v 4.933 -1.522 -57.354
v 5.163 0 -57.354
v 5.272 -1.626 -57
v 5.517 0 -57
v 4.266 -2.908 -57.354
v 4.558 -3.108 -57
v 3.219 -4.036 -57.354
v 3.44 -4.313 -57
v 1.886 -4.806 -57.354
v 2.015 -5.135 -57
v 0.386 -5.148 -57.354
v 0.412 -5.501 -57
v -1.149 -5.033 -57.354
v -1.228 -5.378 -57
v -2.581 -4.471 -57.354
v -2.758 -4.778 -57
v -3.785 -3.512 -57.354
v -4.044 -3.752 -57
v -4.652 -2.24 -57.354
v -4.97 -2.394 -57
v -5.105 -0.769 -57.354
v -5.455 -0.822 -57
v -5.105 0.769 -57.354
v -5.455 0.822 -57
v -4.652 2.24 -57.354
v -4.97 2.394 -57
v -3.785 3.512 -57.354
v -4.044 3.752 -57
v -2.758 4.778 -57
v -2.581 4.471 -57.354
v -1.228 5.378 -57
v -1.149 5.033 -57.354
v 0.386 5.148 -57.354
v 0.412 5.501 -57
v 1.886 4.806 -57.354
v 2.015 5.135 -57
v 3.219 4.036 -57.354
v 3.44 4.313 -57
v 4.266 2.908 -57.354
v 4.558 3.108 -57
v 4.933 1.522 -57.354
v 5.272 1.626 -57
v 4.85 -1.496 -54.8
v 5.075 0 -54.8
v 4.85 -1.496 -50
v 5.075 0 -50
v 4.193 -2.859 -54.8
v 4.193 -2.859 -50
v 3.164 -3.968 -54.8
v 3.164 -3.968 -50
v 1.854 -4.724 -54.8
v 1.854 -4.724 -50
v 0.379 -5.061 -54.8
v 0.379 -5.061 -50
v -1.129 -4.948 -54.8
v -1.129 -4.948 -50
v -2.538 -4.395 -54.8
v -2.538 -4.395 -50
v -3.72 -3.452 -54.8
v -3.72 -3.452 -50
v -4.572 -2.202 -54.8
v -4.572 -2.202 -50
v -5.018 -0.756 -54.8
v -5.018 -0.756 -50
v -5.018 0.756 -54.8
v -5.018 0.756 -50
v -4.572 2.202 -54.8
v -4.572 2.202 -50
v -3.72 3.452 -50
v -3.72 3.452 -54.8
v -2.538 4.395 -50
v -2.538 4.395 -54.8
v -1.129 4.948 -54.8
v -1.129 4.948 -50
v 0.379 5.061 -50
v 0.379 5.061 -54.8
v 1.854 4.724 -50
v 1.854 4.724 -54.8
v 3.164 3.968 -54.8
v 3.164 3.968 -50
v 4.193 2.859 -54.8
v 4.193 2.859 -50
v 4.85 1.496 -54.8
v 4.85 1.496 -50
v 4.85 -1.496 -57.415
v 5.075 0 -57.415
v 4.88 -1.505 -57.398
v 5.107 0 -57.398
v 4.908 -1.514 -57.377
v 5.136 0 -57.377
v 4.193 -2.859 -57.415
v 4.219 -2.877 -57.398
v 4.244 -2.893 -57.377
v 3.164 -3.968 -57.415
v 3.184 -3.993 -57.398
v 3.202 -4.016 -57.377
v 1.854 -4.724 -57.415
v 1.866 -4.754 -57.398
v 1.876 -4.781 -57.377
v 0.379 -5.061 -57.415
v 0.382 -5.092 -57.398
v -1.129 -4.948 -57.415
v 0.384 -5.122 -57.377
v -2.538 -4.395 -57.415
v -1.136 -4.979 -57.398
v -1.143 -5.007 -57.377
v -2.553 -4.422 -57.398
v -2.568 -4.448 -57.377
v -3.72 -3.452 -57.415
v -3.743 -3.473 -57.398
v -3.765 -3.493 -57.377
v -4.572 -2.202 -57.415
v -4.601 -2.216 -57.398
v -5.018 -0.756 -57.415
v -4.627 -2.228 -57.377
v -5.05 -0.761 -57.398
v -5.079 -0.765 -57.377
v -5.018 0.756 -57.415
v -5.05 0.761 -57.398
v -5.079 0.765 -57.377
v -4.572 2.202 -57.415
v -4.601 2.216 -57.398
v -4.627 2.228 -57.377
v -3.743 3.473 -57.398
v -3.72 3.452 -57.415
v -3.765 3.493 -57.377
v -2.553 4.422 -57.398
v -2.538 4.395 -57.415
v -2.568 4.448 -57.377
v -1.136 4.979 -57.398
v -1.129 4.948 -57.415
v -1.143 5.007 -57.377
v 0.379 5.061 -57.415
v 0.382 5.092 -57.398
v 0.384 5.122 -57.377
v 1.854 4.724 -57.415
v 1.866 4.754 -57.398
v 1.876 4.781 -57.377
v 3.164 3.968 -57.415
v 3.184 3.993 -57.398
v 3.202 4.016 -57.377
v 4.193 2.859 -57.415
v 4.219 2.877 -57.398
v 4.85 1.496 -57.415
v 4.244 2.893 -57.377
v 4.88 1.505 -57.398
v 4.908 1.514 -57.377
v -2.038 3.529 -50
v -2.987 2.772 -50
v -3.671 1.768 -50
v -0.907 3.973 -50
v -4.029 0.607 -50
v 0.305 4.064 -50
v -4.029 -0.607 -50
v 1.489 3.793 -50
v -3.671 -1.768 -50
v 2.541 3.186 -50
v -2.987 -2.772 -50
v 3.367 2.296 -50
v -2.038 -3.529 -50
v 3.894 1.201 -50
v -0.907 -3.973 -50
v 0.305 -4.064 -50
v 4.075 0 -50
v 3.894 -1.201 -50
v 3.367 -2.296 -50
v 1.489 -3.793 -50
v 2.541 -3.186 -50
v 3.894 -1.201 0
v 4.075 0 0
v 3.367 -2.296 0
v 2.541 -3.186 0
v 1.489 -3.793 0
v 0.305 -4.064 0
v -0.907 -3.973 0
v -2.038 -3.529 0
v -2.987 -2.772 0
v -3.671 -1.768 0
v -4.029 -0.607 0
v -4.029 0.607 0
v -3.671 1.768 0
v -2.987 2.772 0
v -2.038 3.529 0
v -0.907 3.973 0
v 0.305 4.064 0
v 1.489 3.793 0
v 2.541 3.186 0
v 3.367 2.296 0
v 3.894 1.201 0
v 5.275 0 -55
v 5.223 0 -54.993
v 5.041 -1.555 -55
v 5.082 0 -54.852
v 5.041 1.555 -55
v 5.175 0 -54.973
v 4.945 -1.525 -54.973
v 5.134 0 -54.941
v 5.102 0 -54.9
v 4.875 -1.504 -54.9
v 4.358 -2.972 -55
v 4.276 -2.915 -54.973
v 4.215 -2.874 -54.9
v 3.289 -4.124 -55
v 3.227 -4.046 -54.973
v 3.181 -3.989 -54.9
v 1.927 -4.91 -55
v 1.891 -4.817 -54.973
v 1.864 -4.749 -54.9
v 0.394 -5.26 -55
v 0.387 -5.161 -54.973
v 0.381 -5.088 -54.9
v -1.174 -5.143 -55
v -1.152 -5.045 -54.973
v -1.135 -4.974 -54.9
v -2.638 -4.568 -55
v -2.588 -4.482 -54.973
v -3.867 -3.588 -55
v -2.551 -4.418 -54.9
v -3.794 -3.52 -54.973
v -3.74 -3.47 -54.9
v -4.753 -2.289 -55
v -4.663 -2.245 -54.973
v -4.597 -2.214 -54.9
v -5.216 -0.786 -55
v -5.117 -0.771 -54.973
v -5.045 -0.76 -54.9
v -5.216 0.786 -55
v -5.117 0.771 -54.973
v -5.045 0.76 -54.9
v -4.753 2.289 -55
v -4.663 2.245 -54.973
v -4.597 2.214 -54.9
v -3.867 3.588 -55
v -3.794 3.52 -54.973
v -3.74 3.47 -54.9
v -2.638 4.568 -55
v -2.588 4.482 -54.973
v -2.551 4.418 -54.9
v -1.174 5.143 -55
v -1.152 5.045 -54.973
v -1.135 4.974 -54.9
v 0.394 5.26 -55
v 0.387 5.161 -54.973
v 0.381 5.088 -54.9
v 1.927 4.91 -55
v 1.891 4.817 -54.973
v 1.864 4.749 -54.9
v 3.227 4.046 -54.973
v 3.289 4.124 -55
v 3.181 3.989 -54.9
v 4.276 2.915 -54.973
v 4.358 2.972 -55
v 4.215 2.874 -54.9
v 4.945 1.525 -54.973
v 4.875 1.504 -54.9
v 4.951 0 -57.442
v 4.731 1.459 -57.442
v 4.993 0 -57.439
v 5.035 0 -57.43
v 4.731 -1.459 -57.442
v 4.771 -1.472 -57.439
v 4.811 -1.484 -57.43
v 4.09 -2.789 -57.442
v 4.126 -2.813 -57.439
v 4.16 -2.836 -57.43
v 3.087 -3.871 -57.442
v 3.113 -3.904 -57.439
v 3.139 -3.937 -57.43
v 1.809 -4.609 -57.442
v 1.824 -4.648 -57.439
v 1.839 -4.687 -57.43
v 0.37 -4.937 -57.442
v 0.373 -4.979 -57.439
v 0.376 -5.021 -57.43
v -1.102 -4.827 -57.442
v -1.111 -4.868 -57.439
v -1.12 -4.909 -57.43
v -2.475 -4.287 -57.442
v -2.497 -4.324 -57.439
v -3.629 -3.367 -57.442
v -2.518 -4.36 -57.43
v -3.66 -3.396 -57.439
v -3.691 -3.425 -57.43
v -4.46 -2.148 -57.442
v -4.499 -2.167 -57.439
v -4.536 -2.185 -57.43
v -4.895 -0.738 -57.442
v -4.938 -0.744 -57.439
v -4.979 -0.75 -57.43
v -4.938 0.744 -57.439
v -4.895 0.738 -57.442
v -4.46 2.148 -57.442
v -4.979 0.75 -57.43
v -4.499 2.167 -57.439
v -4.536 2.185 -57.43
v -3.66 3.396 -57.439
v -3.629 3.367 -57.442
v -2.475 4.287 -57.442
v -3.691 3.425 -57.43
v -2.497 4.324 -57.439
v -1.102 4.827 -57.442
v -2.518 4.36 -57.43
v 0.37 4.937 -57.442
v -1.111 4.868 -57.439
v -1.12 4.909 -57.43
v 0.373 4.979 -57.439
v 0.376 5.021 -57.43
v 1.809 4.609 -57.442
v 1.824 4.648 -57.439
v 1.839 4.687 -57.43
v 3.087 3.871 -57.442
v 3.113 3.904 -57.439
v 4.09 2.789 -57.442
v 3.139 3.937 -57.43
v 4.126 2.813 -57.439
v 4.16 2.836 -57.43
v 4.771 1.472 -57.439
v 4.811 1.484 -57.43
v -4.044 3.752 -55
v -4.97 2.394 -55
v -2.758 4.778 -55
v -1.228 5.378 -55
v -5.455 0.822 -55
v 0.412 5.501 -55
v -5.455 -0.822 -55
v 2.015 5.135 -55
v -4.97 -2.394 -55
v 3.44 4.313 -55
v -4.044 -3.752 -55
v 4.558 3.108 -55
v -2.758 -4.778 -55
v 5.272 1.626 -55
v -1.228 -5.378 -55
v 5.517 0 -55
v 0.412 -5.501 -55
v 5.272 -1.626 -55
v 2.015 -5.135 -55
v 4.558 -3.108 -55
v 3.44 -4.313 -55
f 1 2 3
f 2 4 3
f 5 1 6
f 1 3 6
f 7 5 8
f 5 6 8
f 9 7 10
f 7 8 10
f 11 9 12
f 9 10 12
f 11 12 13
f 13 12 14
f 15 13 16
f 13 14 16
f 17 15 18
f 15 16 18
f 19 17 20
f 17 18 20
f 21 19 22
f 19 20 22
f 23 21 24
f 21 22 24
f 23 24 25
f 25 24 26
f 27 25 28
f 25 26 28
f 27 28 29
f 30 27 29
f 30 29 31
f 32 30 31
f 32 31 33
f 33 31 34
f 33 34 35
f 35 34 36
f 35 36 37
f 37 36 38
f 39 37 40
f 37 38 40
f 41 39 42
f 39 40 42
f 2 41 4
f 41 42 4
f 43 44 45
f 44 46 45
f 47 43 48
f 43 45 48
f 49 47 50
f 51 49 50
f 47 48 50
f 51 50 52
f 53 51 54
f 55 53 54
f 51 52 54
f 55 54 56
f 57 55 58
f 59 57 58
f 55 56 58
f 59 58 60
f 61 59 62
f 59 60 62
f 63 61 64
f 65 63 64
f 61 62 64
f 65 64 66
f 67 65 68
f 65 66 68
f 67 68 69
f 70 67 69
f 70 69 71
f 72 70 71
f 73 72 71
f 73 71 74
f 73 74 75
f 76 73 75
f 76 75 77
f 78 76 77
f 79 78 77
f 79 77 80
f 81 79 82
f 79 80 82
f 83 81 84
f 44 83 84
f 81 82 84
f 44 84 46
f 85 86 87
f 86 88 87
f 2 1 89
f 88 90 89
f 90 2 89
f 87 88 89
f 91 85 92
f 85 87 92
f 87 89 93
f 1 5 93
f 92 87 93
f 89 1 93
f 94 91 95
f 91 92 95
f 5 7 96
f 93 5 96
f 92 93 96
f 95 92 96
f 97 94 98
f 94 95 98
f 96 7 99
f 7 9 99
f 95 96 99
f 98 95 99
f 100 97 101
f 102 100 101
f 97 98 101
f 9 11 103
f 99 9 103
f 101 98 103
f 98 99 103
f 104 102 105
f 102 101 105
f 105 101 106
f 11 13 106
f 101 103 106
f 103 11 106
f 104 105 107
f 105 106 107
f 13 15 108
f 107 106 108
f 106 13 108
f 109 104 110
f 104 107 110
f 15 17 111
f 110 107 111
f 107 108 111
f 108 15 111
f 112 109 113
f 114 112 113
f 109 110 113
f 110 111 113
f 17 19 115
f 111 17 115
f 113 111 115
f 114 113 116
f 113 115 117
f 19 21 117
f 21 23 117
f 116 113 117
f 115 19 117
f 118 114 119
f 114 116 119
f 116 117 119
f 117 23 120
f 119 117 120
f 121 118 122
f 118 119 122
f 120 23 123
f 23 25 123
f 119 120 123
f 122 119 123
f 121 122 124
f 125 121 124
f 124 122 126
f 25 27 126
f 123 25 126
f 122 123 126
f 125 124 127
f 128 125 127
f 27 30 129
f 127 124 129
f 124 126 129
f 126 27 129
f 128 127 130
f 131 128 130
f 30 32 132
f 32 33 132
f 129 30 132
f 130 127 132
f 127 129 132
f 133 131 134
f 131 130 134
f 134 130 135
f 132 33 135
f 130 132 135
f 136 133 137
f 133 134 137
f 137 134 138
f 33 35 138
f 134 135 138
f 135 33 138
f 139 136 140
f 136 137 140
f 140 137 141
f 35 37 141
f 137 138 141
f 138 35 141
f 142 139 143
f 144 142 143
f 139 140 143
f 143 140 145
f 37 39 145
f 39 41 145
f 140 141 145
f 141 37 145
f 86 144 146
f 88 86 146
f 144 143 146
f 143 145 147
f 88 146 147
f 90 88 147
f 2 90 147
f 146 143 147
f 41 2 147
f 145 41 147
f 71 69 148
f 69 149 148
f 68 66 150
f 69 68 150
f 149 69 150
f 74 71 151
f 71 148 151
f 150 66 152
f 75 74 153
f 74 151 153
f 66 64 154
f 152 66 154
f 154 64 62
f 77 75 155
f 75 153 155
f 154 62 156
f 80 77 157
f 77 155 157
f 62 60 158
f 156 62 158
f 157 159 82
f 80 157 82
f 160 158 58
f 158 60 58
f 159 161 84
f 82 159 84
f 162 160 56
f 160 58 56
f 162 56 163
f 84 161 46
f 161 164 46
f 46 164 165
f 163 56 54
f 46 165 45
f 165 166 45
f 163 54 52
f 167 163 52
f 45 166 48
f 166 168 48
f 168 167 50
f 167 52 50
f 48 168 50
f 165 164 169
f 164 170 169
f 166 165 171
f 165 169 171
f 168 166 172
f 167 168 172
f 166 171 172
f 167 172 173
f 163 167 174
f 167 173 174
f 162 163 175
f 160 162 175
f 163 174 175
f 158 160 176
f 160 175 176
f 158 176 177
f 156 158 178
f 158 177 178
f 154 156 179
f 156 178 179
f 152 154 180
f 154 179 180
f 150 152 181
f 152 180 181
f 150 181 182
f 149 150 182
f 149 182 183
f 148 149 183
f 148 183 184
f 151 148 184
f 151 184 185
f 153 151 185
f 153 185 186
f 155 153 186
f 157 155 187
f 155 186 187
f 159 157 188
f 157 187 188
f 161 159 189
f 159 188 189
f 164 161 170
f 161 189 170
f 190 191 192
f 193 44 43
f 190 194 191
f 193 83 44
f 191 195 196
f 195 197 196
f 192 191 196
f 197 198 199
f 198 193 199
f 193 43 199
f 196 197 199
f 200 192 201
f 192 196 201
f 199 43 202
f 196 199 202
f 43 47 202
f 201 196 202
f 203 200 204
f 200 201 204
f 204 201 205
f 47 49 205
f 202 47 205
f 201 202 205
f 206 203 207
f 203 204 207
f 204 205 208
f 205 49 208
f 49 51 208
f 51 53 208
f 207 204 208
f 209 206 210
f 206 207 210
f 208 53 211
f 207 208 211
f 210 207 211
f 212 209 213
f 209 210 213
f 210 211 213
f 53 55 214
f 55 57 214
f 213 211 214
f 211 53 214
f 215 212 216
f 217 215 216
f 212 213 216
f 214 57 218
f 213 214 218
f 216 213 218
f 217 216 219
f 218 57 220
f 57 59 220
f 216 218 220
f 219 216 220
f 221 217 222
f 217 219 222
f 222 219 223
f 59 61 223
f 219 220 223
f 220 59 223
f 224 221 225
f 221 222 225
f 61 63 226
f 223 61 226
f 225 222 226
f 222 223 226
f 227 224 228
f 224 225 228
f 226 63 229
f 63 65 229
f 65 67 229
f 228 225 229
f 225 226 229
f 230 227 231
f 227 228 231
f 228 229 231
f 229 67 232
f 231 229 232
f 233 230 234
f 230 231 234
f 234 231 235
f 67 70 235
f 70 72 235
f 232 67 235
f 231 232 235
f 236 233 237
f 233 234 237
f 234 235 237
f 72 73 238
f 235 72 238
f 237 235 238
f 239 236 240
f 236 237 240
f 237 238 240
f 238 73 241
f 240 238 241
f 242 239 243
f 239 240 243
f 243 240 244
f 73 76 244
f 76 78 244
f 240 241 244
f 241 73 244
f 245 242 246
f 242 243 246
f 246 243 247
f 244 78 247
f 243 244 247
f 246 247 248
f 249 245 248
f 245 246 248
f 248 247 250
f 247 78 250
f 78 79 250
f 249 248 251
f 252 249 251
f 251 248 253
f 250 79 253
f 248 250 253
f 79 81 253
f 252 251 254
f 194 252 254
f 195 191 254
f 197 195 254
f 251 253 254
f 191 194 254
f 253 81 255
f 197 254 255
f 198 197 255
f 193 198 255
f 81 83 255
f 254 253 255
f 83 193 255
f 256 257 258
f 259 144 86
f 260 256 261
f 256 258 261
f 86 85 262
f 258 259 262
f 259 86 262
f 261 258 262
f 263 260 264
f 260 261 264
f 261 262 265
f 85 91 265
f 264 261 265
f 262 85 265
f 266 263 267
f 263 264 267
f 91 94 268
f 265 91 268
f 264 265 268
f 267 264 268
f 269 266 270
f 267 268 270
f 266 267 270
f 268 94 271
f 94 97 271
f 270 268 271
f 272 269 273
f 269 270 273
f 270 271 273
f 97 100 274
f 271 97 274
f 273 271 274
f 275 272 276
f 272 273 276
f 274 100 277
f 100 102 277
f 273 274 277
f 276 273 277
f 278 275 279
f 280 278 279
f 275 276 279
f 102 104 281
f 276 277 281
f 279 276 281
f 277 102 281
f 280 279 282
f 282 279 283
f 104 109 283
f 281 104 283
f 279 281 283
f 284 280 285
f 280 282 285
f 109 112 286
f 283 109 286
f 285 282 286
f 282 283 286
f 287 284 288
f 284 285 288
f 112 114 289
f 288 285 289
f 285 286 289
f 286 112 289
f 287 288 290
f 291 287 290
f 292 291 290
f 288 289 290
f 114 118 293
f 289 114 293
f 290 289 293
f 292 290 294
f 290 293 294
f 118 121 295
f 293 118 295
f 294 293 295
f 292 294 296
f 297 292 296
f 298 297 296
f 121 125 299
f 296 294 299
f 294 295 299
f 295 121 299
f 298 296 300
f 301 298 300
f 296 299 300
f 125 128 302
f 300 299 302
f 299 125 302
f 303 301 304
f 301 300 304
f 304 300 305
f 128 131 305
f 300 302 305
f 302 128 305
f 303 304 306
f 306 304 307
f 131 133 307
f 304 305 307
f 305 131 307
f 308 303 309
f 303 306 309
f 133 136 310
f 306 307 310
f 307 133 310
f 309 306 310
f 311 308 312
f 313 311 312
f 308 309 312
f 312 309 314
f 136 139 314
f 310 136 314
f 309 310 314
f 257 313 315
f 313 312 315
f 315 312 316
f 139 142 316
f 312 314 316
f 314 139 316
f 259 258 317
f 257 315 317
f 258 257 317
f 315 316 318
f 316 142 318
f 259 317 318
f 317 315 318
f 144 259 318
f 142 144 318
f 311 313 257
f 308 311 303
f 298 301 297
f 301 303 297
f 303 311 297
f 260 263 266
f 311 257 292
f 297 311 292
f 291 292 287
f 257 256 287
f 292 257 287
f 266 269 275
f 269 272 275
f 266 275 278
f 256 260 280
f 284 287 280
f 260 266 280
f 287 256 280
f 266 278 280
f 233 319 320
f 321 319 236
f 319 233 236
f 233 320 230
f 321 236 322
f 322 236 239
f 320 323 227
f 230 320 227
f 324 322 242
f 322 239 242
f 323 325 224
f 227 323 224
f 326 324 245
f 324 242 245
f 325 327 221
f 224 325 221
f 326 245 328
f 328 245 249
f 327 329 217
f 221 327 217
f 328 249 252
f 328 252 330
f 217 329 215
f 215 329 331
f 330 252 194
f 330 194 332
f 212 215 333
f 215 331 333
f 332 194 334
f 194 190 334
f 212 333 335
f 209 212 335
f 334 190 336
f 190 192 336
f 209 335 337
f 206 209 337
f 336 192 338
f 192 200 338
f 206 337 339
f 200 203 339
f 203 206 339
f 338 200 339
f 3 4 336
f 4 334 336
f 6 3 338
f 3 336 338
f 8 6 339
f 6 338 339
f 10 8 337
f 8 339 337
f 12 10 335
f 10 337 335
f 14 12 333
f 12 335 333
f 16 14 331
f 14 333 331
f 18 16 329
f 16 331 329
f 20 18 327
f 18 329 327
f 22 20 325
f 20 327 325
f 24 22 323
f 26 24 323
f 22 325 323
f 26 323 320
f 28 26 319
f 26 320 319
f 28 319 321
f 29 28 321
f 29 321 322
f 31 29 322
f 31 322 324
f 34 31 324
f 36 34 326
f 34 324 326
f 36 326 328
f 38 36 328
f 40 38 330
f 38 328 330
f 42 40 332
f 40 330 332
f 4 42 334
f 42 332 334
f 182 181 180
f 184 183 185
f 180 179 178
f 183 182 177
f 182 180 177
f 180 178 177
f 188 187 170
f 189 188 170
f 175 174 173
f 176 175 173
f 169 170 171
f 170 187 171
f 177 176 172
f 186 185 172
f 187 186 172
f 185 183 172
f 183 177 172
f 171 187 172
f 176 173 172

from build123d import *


with BuildPart() as f1:
    # F0 (on Front) → F1 (revolve)
    with BuildSketch(Plane.XZ):
        with BuildLine():
            Line((4.075, 0), (0, 0))
            Line((0, 0), (0, -57.4416))
            Line((0, -57.4416), (4.950736, -57.4416))
            ThreePointArc((4.950736, -57.4416), (5.014312, -57.434786), (5.075, -57.414654))
            ThreePointArc((5.075, -57.414654), (5.12167, -57.388139), (5.162868, -57.353732))
            Line((5.162868, -57.353732), (5.5166, -57))
            Line((5.5166, -57), (5.5166, -55))
            Line((5.5166, -55), (5.275, -55))
            ThreePointArc((5.275, -55), (5.133579, -54.941421), (5.075, -54.8))
            Line((5.075, -54.8), (5.075, -50))
            Line((5.075, -50), (4.075, -50))
            Line((4.075, -50), (4.075, 0))
        make_face()
    revolve(axis=Axis((0, 0, -28.7208), (0, 0, -1)))


solid = f1.part
